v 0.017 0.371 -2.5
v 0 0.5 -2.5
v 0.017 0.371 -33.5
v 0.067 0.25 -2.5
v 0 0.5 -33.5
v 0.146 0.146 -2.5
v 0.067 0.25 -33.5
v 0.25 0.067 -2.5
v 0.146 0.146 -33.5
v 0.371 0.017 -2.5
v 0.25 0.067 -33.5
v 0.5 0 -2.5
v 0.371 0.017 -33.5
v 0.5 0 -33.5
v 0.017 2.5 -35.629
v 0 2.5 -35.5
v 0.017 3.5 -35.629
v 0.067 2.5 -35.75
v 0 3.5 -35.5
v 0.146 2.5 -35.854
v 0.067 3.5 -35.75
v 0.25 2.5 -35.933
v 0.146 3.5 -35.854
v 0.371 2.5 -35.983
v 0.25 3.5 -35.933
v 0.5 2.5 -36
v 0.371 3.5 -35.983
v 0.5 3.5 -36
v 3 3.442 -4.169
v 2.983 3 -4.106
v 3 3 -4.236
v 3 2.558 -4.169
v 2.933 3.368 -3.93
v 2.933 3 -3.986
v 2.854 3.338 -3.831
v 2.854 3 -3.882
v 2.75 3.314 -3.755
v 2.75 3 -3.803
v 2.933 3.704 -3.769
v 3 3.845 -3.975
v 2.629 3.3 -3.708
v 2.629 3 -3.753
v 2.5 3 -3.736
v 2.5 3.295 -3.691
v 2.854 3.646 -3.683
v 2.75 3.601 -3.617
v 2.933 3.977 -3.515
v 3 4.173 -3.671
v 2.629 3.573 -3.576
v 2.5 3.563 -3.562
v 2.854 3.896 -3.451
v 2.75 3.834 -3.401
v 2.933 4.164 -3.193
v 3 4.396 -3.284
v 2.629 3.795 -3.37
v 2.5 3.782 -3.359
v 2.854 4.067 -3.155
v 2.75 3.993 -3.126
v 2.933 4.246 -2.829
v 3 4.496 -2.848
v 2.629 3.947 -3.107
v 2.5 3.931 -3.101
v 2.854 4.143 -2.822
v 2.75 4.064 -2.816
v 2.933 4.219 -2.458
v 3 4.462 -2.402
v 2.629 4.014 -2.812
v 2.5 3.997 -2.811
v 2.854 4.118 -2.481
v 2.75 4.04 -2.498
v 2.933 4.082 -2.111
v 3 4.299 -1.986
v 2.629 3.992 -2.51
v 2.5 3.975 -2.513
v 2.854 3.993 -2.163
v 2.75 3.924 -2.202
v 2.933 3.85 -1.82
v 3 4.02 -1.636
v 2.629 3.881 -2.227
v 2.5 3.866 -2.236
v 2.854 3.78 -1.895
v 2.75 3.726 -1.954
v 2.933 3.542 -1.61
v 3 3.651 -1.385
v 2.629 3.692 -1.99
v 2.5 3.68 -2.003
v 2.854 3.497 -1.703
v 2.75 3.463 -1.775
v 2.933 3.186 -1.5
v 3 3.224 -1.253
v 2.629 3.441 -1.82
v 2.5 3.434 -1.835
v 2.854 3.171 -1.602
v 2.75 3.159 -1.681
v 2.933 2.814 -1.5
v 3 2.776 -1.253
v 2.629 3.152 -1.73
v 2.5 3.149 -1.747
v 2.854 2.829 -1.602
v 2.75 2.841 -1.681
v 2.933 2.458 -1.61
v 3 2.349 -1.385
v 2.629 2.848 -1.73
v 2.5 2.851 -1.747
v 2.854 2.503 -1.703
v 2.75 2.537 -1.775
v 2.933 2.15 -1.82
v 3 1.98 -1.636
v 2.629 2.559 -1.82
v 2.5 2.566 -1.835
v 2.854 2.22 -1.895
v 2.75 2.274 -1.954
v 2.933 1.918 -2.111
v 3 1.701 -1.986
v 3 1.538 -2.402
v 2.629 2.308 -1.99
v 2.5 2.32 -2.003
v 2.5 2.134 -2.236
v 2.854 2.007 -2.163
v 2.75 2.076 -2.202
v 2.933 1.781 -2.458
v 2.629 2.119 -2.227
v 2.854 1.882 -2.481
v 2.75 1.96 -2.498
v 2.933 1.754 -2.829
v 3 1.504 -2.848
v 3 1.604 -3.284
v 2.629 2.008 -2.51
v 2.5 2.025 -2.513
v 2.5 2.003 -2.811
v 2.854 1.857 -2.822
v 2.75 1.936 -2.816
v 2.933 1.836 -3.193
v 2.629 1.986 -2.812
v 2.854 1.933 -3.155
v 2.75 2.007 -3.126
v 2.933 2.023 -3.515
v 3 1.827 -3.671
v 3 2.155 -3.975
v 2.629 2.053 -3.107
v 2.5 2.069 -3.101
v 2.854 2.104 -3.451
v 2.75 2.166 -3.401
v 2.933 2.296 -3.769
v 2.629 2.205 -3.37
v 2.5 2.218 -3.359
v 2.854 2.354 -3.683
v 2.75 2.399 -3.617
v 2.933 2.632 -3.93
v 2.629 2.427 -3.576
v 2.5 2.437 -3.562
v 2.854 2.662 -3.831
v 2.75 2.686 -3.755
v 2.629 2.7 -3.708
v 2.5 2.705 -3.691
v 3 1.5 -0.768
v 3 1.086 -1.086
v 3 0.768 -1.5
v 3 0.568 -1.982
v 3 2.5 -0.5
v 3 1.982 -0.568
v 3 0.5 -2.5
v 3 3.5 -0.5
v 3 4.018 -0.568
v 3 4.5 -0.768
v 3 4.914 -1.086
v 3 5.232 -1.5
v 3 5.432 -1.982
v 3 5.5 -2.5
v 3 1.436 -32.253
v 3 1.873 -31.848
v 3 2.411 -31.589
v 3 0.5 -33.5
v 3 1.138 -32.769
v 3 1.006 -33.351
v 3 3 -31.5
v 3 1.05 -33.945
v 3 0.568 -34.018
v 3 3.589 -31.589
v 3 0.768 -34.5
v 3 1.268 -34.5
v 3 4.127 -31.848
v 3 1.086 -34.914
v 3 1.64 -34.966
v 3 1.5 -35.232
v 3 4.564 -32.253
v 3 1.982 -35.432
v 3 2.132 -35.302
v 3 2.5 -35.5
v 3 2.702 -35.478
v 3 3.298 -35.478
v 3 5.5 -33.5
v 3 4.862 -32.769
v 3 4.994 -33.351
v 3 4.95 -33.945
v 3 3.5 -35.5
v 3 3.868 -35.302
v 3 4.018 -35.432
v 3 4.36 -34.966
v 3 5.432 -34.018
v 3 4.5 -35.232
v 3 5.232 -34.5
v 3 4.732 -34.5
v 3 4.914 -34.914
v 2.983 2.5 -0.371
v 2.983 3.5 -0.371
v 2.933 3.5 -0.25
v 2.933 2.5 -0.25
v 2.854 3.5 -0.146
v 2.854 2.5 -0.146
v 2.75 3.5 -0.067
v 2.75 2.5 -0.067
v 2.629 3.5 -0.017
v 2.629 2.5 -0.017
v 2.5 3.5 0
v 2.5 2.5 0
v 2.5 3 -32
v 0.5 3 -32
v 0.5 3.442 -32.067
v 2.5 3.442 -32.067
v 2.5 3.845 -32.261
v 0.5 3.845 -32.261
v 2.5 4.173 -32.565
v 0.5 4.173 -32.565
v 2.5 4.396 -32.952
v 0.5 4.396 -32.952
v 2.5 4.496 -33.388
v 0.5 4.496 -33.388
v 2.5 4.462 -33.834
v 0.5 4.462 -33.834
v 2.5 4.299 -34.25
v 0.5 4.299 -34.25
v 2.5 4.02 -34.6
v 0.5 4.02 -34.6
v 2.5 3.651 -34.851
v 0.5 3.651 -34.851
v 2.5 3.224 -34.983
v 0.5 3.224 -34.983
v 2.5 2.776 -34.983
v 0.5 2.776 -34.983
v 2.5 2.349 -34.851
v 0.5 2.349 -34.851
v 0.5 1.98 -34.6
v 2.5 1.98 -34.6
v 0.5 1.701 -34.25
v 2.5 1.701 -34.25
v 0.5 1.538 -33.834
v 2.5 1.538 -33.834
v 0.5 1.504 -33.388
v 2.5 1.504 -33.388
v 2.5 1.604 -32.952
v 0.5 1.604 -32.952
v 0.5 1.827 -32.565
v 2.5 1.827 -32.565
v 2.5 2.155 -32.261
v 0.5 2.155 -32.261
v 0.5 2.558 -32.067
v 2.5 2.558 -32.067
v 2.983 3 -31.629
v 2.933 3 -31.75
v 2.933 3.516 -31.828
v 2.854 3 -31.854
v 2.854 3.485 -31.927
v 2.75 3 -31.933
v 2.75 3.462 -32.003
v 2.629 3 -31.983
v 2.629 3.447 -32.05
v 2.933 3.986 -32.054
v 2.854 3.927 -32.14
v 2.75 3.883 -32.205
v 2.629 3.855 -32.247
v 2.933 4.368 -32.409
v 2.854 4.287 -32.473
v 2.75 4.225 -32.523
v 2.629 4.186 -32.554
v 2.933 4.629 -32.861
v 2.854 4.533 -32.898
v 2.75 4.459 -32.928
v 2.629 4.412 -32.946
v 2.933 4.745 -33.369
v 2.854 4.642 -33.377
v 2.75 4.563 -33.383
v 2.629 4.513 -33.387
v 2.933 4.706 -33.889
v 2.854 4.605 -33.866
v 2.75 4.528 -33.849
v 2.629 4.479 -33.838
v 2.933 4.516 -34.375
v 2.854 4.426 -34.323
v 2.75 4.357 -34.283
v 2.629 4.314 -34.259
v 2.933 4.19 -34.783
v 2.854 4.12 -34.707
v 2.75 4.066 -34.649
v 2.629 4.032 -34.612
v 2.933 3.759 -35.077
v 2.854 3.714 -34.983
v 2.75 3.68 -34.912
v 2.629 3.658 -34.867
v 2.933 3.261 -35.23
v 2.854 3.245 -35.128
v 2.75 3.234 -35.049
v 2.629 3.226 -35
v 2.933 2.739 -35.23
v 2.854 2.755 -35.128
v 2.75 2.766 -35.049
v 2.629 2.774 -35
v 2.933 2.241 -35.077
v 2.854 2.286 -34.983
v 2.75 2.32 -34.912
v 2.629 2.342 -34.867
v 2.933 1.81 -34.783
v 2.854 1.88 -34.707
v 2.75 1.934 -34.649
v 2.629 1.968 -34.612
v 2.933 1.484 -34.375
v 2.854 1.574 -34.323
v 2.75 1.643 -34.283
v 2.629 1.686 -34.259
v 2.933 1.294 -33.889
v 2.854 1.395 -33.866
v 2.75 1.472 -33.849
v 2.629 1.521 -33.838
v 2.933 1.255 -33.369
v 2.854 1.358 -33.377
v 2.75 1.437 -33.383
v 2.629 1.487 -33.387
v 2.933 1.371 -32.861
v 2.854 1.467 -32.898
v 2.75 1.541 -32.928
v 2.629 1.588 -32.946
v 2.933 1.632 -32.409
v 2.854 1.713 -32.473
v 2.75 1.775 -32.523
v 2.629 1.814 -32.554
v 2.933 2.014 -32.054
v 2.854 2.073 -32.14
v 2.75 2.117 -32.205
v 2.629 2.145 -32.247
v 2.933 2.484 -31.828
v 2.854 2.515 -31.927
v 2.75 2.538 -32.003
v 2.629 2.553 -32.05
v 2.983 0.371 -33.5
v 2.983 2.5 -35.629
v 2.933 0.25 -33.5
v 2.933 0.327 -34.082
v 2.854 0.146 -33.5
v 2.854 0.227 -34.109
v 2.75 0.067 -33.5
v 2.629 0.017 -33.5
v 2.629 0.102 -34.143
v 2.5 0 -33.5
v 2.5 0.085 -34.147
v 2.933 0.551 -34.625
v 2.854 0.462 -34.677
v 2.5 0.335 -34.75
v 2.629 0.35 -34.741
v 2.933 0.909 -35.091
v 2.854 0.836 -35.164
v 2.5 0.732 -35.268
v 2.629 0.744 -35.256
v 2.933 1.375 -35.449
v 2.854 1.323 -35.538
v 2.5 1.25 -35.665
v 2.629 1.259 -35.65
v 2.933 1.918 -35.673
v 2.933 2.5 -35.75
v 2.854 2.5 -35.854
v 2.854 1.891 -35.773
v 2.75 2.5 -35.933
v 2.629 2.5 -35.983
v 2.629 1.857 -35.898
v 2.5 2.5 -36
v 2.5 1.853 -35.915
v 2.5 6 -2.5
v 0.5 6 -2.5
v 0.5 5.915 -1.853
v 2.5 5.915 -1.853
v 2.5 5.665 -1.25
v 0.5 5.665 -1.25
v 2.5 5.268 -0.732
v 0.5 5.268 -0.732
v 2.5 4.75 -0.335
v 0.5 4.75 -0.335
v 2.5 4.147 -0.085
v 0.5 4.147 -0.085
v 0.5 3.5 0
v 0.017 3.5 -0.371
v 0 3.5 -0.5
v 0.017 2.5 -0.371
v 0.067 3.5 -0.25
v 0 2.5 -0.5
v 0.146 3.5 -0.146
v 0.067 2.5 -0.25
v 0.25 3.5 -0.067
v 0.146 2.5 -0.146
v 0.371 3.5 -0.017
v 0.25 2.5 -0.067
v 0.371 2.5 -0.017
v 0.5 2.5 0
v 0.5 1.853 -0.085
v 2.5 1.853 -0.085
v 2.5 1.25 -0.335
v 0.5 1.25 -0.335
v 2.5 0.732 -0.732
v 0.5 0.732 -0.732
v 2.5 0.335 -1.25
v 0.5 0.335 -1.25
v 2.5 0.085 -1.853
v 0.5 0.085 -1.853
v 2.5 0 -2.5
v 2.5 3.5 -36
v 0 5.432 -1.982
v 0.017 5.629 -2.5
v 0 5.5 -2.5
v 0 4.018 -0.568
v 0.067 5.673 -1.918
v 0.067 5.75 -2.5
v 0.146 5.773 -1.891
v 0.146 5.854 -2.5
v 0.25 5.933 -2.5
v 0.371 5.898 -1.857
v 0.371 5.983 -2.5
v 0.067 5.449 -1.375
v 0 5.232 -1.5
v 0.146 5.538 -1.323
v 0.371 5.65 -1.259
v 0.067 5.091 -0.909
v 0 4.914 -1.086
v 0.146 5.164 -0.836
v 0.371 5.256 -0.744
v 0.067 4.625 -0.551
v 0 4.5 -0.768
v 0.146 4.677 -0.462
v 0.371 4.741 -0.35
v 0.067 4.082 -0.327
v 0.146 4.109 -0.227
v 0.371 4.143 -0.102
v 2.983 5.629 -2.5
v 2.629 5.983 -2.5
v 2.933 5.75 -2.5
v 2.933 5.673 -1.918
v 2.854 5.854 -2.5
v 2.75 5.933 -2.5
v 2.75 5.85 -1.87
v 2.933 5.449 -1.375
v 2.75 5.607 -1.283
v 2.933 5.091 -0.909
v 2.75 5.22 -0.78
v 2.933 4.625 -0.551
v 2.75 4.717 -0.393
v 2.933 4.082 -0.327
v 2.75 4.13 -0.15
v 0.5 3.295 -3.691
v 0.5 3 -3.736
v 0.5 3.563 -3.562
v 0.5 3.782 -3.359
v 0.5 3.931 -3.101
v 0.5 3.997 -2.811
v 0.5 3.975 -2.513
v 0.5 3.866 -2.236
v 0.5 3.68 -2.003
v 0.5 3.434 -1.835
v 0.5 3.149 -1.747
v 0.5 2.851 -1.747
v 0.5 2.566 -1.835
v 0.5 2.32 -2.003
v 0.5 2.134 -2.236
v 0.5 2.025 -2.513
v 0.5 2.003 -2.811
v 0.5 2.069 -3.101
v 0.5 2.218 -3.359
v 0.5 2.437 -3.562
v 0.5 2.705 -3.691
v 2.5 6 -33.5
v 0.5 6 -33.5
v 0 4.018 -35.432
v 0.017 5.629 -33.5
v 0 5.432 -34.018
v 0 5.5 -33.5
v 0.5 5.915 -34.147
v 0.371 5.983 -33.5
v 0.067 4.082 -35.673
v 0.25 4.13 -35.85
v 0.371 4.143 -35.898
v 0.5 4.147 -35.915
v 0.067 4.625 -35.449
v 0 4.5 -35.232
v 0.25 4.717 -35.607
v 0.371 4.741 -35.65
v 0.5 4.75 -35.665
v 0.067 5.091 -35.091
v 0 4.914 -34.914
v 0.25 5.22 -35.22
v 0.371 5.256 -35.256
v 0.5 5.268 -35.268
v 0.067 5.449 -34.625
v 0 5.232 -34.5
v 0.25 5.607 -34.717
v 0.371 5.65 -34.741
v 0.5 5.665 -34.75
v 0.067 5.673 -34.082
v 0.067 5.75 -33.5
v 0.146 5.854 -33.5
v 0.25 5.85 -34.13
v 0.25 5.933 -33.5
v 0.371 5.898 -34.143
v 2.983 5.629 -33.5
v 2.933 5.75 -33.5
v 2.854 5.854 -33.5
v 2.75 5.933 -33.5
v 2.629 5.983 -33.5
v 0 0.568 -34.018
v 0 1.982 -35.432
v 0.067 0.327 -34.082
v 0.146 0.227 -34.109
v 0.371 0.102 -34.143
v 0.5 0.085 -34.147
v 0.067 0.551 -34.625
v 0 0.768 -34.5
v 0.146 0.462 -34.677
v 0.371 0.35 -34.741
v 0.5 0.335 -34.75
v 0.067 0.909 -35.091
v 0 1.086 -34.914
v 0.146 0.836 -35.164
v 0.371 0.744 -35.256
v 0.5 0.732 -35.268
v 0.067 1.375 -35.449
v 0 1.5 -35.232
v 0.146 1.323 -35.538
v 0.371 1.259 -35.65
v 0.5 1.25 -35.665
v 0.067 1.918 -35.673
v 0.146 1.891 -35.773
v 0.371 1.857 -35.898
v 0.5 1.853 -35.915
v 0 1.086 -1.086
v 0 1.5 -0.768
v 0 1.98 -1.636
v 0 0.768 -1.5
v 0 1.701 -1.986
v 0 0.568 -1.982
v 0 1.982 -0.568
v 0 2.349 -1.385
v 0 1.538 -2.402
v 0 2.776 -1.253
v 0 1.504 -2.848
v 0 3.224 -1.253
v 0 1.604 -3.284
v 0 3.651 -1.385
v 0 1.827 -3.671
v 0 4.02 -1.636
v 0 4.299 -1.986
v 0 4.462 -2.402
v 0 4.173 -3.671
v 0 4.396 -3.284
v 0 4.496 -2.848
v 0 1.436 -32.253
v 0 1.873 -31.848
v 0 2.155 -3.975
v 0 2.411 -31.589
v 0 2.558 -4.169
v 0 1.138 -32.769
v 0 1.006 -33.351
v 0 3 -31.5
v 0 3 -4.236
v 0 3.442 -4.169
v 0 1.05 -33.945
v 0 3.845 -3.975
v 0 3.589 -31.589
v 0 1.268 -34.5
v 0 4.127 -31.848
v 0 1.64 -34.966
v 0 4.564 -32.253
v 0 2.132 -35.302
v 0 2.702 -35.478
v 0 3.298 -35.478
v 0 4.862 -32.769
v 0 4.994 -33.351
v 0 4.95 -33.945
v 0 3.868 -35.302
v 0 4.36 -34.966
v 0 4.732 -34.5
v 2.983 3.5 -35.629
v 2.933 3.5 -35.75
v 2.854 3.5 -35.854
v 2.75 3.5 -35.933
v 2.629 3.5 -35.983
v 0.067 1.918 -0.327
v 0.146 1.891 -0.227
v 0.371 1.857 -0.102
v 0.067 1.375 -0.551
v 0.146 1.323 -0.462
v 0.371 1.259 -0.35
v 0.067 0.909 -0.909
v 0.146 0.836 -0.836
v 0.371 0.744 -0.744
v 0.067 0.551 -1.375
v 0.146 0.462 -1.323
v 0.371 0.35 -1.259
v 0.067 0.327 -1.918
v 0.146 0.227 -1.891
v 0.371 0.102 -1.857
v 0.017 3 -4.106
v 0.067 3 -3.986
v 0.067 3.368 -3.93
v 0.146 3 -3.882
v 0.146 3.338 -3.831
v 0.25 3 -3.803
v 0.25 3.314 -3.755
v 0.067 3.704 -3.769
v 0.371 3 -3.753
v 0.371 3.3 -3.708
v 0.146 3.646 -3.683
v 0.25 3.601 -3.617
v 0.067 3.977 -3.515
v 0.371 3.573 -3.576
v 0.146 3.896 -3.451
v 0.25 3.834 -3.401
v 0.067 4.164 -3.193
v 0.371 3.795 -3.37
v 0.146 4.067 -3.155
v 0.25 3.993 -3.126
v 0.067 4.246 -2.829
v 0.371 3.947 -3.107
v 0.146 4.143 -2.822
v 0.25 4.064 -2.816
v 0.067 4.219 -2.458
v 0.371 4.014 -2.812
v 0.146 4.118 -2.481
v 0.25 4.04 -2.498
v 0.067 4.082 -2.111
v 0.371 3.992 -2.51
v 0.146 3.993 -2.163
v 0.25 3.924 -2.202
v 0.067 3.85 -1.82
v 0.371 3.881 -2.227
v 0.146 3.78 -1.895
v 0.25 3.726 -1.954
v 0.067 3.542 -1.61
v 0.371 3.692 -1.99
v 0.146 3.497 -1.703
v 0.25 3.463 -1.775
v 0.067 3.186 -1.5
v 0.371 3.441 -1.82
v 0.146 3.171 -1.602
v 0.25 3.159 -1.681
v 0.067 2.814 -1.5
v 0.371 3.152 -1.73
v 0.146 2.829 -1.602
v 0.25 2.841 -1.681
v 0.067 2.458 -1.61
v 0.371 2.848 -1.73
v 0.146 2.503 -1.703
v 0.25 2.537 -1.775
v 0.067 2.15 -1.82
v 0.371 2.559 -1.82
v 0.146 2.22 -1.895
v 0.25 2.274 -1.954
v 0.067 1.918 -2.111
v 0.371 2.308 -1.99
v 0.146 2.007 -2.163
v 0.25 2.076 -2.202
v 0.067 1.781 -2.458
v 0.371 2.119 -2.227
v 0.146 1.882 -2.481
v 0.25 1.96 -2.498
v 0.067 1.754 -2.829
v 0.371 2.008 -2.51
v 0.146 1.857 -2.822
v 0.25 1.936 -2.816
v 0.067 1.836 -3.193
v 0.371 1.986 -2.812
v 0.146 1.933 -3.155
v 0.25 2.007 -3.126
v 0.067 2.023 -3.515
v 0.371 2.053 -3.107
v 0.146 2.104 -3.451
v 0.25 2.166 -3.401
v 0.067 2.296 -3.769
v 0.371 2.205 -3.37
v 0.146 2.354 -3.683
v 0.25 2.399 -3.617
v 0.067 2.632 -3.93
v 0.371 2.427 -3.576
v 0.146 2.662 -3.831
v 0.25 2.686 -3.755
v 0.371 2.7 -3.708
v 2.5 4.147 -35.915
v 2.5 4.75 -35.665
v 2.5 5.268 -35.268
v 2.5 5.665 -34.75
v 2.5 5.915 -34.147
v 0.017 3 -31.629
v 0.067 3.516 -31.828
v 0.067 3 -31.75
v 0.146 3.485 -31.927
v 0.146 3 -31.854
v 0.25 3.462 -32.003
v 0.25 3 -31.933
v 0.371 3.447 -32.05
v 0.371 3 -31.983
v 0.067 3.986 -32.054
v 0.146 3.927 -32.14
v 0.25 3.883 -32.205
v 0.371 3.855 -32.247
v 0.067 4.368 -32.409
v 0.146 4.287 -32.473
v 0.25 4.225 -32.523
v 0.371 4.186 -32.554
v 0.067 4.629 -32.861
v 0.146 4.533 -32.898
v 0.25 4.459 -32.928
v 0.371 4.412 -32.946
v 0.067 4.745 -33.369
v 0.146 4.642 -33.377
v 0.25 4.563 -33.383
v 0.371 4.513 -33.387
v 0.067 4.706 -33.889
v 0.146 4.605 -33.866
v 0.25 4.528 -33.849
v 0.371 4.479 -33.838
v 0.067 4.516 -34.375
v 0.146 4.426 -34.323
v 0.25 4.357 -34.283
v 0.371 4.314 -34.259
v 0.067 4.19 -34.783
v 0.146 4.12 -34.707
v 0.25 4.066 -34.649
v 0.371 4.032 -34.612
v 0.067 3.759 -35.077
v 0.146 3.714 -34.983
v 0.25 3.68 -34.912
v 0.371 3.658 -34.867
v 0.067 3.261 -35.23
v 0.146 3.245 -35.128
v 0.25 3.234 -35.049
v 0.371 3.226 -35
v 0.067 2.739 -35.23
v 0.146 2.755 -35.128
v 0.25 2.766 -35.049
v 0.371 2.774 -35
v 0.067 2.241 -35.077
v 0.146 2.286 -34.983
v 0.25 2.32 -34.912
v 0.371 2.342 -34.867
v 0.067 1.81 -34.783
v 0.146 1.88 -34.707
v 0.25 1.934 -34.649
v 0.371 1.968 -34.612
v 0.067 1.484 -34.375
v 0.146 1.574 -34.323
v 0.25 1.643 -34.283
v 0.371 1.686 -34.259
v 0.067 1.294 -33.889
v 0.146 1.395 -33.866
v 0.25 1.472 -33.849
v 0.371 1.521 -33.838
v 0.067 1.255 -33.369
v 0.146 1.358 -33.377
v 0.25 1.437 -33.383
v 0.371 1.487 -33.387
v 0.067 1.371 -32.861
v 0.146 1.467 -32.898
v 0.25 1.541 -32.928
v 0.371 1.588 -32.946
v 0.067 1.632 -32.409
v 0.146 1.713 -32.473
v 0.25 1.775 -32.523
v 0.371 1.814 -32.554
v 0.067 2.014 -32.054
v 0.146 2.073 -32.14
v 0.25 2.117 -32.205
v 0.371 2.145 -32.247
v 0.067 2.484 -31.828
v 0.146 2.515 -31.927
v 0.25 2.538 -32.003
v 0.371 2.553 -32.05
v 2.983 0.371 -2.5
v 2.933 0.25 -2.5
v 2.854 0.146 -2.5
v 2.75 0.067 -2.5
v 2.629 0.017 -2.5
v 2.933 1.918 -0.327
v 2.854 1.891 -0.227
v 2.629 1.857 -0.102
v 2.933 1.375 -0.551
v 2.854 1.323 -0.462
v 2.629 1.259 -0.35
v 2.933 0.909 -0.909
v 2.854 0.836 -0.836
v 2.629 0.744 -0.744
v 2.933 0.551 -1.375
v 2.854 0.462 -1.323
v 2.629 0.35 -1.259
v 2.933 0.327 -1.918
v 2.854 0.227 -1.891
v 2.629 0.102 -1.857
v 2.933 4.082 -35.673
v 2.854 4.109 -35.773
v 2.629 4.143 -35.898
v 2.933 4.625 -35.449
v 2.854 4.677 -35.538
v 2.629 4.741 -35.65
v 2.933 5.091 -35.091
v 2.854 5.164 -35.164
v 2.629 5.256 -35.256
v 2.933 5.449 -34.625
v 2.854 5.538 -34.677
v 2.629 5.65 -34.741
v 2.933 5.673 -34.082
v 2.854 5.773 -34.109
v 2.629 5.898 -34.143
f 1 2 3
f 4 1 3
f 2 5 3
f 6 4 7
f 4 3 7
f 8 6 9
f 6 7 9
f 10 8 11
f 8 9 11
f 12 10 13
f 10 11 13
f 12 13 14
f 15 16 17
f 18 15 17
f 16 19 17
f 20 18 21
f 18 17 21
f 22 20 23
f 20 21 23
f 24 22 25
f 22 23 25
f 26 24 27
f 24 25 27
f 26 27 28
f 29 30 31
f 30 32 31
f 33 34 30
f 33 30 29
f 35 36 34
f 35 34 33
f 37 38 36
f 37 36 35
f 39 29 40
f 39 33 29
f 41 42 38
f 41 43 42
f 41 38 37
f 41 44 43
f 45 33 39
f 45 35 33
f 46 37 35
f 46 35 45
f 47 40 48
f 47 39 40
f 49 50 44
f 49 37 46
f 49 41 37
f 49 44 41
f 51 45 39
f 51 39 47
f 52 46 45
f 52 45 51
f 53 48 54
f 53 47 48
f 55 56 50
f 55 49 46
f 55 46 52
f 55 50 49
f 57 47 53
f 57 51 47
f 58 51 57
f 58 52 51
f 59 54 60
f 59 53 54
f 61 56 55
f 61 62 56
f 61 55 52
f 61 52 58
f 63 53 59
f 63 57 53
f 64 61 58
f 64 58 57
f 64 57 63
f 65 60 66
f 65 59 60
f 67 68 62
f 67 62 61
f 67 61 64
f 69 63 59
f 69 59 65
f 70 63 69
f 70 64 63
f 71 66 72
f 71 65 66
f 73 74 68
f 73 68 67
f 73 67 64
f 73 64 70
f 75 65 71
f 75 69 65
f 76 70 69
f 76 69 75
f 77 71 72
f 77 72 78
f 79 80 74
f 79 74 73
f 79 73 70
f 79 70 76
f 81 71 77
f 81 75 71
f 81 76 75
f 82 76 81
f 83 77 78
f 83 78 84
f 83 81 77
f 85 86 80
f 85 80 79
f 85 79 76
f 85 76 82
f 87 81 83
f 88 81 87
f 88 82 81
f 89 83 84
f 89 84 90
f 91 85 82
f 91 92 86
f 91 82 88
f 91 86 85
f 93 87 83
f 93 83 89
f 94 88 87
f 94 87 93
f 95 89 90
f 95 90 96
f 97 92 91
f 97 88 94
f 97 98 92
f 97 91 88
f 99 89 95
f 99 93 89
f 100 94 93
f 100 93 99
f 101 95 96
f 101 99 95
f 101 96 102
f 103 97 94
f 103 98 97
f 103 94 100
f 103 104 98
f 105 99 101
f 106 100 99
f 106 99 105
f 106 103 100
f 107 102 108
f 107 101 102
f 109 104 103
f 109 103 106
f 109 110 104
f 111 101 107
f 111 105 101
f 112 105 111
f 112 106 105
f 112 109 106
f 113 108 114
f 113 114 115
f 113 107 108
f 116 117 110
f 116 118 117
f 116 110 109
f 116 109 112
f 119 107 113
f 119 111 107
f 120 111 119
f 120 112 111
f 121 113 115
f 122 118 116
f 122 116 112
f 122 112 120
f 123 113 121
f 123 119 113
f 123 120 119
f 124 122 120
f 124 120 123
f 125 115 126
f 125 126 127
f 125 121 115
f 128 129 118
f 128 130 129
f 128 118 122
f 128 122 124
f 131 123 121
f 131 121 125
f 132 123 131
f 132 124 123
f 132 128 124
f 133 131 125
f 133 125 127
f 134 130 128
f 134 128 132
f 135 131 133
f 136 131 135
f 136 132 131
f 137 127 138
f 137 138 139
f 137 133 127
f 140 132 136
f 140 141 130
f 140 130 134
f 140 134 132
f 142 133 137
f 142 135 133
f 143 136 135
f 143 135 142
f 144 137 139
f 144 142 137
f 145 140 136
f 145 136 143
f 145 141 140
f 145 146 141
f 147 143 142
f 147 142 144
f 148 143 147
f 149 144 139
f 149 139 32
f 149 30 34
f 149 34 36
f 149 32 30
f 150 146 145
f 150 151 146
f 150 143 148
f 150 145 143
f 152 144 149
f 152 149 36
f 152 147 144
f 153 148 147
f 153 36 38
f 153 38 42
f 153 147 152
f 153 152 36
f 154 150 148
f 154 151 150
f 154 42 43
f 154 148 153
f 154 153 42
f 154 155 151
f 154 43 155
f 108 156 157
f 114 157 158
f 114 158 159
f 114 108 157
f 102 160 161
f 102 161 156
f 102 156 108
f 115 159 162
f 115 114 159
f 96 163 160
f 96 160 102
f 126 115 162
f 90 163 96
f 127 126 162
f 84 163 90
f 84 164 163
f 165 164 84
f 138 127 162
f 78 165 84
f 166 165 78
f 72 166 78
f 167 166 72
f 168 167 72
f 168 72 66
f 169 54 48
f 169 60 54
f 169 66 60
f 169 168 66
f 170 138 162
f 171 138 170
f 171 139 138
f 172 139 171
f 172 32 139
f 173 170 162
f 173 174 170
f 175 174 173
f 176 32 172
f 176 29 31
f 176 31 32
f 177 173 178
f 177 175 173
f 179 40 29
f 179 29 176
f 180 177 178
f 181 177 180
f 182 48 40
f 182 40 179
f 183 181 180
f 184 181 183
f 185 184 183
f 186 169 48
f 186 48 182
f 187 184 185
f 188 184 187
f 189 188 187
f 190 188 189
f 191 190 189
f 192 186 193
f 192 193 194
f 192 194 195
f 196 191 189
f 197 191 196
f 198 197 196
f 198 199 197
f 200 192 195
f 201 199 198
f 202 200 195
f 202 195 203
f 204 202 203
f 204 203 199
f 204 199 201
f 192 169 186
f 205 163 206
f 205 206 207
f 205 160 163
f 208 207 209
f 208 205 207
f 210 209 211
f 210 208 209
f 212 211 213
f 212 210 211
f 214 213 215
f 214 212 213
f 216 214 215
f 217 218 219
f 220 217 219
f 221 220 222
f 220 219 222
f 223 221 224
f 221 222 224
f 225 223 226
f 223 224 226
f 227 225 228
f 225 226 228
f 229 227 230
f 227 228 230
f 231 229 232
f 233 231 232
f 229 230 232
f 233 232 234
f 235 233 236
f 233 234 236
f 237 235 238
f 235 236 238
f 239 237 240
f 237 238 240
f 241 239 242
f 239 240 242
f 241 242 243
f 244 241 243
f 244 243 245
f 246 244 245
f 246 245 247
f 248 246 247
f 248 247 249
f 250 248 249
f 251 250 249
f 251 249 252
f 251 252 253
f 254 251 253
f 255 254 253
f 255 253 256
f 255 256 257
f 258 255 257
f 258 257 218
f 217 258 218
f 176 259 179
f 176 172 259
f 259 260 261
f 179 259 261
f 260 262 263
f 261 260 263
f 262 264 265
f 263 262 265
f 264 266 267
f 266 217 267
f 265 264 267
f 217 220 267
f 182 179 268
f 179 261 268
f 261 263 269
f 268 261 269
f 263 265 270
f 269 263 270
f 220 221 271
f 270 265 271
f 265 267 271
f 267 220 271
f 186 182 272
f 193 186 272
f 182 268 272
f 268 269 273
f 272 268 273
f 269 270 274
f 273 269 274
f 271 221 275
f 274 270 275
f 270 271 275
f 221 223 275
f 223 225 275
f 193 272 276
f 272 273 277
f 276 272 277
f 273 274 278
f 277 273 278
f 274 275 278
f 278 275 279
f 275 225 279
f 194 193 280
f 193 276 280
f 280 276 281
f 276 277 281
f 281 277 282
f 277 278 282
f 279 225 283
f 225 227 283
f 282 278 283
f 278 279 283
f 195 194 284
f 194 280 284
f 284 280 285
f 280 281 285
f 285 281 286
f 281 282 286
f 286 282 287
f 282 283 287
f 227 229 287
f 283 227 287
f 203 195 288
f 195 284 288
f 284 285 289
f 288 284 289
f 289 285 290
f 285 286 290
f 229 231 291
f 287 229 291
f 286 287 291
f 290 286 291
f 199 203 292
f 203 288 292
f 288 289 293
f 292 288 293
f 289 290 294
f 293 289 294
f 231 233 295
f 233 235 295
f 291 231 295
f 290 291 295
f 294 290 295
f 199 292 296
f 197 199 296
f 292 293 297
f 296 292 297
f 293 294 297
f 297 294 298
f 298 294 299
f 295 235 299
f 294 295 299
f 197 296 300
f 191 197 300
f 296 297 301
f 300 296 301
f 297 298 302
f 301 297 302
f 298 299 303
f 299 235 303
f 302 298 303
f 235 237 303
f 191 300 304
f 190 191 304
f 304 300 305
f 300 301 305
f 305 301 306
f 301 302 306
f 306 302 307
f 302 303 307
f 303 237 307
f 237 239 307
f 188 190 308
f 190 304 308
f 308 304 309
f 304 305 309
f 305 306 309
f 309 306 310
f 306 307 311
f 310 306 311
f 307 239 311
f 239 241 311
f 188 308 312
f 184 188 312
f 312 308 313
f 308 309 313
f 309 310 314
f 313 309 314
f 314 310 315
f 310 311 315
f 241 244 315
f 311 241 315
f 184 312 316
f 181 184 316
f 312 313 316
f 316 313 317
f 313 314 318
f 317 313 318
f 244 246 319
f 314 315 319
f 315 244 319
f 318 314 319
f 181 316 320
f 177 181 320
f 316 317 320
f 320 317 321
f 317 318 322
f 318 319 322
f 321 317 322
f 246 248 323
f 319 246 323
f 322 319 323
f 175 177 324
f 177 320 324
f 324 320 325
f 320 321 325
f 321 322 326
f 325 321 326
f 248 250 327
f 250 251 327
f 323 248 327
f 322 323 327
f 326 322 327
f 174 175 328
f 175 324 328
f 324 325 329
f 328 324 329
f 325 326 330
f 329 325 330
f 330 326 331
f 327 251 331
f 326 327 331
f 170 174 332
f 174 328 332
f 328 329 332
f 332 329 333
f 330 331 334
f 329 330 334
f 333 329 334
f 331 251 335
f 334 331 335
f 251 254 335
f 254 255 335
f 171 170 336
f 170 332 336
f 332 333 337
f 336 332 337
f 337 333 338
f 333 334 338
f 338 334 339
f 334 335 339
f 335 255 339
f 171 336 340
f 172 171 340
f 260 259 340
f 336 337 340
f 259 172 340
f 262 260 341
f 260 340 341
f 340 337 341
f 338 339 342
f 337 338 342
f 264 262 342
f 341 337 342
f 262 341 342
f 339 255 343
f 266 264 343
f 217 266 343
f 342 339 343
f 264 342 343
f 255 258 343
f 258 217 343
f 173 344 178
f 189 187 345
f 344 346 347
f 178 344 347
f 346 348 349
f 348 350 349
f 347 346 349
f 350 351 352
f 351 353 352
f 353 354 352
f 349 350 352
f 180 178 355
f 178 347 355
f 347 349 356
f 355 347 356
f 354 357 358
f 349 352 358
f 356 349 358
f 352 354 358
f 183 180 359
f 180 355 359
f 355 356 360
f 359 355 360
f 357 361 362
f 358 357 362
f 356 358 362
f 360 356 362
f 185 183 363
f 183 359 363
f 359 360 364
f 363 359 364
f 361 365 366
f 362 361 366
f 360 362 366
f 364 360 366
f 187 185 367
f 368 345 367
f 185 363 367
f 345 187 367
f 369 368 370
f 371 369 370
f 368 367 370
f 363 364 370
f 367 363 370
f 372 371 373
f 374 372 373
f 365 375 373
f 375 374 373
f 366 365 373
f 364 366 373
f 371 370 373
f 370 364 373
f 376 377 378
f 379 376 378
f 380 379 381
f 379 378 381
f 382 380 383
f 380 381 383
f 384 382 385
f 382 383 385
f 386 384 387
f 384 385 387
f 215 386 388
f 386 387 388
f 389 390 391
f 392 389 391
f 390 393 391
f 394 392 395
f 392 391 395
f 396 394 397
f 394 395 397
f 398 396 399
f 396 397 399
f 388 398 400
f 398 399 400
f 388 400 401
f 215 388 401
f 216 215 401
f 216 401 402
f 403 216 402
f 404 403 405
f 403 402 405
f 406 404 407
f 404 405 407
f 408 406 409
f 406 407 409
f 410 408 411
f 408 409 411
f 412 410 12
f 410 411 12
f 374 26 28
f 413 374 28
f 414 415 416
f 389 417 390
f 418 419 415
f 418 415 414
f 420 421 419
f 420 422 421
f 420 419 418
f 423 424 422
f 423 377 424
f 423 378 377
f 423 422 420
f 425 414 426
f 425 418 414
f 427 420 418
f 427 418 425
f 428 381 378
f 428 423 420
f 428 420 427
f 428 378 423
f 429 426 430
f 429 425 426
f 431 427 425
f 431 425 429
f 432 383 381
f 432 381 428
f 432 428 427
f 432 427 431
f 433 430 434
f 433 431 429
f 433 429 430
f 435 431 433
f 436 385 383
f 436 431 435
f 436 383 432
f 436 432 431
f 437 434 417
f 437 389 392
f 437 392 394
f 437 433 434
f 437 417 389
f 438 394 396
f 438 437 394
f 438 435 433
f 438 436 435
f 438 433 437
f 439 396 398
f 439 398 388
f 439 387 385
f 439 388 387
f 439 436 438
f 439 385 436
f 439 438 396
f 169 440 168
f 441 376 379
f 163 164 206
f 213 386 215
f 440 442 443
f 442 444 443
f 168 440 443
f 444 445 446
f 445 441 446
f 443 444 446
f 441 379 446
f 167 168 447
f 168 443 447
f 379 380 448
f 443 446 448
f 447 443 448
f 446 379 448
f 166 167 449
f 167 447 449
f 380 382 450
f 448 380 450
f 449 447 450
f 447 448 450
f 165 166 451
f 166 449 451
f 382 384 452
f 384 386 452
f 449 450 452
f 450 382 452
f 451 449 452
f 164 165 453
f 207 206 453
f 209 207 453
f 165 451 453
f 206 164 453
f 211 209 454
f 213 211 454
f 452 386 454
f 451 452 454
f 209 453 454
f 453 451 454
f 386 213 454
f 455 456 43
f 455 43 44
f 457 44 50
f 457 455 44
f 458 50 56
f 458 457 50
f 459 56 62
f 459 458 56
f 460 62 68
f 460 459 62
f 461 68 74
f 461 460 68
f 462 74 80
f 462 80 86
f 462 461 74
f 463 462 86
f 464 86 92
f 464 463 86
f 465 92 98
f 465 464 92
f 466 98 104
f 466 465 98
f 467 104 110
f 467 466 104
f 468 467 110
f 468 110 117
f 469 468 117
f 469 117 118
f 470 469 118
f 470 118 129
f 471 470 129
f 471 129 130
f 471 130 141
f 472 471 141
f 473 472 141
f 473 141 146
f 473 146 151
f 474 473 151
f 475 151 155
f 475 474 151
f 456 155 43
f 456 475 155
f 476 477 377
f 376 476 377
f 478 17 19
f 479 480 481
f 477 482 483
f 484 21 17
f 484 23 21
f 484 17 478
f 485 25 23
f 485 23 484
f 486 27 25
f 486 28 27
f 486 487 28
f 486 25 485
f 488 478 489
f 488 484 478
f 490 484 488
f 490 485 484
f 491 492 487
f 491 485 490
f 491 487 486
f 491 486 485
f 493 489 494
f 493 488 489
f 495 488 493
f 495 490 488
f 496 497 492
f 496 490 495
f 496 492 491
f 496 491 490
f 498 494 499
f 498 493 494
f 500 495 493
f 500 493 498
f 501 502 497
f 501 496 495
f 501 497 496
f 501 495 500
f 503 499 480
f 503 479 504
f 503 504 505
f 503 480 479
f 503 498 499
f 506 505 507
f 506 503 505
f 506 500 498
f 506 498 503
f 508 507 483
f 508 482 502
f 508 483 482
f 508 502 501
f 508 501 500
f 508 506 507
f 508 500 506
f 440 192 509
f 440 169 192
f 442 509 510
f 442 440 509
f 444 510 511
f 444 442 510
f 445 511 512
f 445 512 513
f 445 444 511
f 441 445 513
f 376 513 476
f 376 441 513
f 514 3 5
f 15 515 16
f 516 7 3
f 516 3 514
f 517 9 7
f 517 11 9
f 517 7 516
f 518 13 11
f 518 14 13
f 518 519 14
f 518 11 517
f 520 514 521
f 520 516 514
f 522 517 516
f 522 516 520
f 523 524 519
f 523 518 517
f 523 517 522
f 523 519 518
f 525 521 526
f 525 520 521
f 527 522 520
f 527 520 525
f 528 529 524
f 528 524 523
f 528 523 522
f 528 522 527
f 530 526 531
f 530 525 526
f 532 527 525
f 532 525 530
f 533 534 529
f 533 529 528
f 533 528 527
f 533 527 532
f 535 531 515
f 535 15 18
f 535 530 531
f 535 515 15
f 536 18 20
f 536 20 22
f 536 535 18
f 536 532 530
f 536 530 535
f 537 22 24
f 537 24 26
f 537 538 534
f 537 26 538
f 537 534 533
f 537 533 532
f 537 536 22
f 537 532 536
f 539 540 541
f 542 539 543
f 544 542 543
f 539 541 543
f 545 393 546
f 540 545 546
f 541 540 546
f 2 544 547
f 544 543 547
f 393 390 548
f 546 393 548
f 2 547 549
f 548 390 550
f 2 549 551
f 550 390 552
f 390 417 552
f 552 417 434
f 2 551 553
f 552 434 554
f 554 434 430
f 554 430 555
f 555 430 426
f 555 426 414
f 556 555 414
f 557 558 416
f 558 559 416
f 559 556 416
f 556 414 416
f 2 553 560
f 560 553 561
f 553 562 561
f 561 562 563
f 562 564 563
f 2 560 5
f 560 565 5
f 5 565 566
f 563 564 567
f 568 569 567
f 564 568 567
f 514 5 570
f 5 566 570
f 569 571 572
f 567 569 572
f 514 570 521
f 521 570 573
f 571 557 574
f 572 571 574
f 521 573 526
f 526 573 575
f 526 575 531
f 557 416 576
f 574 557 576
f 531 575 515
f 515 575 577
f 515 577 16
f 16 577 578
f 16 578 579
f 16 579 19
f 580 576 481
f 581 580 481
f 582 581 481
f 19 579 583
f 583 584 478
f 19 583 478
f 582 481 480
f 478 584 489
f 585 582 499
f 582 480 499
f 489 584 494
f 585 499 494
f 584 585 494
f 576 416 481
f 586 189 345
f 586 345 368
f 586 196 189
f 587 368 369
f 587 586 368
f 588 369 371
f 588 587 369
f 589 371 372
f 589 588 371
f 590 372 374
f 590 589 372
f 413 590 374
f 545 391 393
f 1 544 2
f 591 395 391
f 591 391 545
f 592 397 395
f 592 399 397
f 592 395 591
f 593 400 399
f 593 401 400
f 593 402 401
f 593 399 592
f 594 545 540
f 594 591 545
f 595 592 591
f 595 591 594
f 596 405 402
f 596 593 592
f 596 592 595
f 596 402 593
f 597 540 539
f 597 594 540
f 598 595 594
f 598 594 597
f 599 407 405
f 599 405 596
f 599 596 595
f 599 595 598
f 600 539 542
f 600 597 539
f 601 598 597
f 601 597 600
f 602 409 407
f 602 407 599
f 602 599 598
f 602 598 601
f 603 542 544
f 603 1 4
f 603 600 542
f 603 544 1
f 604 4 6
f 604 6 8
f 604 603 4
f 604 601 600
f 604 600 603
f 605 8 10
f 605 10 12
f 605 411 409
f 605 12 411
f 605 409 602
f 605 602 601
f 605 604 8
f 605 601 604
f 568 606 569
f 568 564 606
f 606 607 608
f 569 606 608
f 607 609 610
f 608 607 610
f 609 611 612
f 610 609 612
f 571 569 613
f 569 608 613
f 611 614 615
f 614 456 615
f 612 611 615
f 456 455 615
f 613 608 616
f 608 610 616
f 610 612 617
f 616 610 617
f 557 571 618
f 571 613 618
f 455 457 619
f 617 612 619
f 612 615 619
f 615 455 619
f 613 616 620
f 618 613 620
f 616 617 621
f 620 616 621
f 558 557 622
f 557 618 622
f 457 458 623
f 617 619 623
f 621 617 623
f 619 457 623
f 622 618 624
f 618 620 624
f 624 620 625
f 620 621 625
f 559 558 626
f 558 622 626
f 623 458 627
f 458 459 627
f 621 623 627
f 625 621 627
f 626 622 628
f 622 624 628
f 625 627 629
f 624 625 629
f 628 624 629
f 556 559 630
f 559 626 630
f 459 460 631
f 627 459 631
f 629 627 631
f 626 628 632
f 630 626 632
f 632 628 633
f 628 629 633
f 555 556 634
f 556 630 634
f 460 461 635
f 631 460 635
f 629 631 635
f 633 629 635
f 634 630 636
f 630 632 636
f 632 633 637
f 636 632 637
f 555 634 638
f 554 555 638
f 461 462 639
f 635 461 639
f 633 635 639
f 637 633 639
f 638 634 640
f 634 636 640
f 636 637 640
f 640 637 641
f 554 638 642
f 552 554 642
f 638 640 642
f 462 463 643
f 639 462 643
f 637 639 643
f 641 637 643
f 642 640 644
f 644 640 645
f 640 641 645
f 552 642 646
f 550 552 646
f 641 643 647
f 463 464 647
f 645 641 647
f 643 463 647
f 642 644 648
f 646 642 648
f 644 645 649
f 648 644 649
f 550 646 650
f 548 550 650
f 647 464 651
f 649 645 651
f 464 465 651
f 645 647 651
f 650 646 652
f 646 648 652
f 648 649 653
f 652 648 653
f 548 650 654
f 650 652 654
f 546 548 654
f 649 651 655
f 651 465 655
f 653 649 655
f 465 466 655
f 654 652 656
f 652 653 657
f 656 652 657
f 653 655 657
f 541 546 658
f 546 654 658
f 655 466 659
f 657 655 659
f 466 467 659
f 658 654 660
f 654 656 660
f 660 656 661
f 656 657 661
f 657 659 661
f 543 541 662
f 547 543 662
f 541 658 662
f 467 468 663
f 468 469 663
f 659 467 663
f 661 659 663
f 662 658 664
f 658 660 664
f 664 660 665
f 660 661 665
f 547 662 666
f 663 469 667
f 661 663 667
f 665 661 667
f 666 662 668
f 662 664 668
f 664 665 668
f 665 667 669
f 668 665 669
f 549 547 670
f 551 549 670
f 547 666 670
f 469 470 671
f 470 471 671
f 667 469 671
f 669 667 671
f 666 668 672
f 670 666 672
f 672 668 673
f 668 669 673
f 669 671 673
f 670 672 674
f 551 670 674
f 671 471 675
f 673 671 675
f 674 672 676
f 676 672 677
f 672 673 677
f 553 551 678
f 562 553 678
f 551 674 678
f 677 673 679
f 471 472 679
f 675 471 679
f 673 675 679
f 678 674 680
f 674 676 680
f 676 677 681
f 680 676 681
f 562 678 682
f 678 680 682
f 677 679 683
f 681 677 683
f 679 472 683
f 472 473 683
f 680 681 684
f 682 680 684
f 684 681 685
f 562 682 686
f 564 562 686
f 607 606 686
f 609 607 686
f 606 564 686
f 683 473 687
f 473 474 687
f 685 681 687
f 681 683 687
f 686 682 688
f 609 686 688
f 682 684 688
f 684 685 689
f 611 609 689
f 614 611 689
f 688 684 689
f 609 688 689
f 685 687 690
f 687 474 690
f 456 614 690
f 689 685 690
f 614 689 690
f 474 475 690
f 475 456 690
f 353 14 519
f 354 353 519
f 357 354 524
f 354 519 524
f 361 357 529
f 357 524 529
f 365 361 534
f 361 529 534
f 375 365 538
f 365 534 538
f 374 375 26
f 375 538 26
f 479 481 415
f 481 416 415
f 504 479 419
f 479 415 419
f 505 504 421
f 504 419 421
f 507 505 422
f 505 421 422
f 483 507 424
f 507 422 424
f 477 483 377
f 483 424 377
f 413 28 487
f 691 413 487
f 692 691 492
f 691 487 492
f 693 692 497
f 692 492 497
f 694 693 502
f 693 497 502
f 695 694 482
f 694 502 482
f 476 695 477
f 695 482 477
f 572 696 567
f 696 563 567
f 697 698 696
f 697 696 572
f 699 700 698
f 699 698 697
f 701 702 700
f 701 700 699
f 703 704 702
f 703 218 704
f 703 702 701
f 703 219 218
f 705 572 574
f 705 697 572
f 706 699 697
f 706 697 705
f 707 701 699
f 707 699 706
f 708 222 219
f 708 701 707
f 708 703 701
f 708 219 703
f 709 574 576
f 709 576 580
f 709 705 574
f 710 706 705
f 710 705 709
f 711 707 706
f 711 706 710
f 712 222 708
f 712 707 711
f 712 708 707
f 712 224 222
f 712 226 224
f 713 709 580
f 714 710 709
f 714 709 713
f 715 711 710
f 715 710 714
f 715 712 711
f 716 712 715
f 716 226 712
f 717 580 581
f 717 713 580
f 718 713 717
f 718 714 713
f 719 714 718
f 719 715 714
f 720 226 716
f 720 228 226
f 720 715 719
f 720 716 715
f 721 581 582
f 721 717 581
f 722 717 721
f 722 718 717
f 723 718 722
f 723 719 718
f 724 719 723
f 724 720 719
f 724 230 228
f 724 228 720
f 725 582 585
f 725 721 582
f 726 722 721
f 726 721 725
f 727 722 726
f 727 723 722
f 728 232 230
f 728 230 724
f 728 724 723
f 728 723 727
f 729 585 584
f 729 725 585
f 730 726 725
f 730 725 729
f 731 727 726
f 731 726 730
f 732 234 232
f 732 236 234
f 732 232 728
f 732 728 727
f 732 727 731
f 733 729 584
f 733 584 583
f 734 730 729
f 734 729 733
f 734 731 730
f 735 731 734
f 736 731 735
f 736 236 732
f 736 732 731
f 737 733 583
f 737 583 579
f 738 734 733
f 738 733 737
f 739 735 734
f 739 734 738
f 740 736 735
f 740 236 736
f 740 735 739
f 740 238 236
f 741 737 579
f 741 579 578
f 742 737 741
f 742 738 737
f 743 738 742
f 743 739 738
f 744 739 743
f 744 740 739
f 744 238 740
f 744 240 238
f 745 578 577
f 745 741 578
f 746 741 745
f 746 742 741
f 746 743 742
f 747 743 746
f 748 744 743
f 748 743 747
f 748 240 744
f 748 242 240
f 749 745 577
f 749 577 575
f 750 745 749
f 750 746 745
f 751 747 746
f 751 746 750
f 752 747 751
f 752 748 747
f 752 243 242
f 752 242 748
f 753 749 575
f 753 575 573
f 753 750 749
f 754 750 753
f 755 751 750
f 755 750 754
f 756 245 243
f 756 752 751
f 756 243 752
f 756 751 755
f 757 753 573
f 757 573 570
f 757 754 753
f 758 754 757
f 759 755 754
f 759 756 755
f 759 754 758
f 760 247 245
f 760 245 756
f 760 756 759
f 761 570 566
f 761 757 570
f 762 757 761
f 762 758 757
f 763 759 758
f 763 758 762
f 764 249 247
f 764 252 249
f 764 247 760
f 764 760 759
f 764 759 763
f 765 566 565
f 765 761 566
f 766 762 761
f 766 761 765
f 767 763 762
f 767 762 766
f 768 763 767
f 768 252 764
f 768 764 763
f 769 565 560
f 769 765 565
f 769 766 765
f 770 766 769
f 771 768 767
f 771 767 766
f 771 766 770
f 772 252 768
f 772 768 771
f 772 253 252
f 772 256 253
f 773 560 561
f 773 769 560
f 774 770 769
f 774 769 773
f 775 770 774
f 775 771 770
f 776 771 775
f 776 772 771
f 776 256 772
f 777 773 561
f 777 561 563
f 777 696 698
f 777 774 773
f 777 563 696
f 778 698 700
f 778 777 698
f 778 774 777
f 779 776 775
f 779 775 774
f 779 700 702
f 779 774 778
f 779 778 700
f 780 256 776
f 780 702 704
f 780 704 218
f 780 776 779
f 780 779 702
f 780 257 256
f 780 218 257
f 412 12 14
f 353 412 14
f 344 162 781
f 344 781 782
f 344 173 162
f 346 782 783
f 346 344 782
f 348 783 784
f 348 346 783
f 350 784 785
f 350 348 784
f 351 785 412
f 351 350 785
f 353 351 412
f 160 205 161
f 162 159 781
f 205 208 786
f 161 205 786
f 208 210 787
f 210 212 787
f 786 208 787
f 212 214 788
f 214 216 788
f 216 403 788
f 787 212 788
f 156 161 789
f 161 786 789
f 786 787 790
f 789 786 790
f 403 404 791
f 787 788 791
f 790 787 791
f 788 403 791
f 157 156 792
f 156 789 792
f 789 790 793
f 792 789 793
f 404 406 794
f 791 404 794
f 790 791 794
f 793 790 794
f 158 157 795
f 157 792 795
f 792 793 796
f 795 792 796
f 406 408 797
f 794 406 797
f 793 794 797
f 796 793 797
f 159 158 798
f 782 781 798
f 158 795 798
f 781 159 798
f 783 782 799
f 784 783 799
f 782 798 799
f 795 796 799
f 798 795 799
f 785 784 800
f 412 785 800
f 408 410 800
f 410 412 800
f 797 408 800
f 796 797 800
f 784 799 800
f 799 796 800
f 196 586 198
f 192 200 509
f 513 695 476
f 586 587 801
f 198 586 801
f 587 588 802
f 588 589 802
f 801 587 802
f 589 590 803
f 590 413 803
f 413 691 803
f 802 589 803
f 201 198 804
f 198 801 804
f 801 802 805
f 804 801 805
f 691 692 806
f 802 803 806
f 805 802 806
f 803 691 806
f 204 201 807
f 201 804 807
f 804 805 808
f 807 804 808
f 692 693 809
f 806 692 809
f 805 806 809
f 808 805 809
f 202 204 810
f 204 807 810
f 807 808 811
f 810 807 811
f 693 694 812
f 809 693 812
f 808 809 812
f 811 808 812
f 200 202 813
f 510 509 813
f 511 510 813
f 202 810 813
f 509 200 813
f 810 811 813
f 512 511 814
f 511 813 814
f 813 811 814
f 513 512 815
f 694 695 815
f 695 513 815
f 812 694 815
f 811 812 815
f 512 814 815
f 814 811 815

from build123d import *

# Parameters (mm, degrees)
SKETCH1_R           = 1
BOSS_EXTRUDE1_DEPTH = 3
SKETCH2_R           = 1.5
CUT_EXTRUDE1_DEPTH  = 10
FILLET1_R           = 0.5


with BuildPart() as part:
    # Sketch1 → Boss-Extrude1 (new body)
    with BuildSketch(Plane(origin=(0, 0, 0), x_dir=(0, 0, -1), z_dir=(1, 0, 0))):
        with BuildLine():
            Line((2.5, 0), (33.5, 0))
            ThreePointArc((33.5, 0), (35.267766953, 0.732233047), (36, 2.5))
            Line((36, 2.5), (36, 3.5))
            ThreePointArc((36, 3.5), (35.267766953, 5.267766953), (33.5, 6))
            Line((33.5, 6), (2.5, 6))
            ThreePointArc((2.5, 6), (0.732233047, 5.267766953), (0, 3.5))
            Line((0, 3.5), (0, 2.5))
            ThreePointArc((0, 2.5), (0.732233047, 0.732233047), (2.5, 0))
        make_face()
        with Locations((2.73587532, 3)):
            Circle(SKETCH1_R, mode=Mode.SUBTRACT)
    extrude(amount=BOSS_EXTRUDE1_DEPTH)

    # Sketch2 → Cut-Extrude1 (cut)
    with BuildSketch(Plane.ZY):
        with Locations((-33.5, 3)):
            Circle(SKETCH2_R)
    extrude(amount=-CUT_EXTRUDE1_DEPTH, mode=Mode.SUBTRACT)

    # Fillet1
    fillet1_edges = [part.edges().sort_by_distance(p)[0] for p in [
        (3, 5.267766953, -0.732233047),
        (0, 6, -18),
        (0, 5.267766953, -35.267766953),
        (3, 3, 0),
        (3, 0.732233047, -0.732233047),
        (3, 0, -18),
        (0, 3, -1.73587532),
        (3, 3, -1.73587532),
        (3, 0.732233047, -35.267766953),
        (3, 3, -36),
        (3, 3, -35),
        (0, 3, -35),
        (3, 5.267766953, -35.267766953),
        (3, 6, -18),
        (0, 3, -36),
        (0, 0.732233047, -35.267766953),
        (0, 0, -18),
        (0, 0.732233047, -0.732233047),
        (0, 3, 0),
        (0, 5.267766953, -0.732233047),
    ]]
    fillet(fillet1_edges, radius=FILLET1_R - 0.0001)  # a hair under: the kernel refuses the full size


solid = part.part
